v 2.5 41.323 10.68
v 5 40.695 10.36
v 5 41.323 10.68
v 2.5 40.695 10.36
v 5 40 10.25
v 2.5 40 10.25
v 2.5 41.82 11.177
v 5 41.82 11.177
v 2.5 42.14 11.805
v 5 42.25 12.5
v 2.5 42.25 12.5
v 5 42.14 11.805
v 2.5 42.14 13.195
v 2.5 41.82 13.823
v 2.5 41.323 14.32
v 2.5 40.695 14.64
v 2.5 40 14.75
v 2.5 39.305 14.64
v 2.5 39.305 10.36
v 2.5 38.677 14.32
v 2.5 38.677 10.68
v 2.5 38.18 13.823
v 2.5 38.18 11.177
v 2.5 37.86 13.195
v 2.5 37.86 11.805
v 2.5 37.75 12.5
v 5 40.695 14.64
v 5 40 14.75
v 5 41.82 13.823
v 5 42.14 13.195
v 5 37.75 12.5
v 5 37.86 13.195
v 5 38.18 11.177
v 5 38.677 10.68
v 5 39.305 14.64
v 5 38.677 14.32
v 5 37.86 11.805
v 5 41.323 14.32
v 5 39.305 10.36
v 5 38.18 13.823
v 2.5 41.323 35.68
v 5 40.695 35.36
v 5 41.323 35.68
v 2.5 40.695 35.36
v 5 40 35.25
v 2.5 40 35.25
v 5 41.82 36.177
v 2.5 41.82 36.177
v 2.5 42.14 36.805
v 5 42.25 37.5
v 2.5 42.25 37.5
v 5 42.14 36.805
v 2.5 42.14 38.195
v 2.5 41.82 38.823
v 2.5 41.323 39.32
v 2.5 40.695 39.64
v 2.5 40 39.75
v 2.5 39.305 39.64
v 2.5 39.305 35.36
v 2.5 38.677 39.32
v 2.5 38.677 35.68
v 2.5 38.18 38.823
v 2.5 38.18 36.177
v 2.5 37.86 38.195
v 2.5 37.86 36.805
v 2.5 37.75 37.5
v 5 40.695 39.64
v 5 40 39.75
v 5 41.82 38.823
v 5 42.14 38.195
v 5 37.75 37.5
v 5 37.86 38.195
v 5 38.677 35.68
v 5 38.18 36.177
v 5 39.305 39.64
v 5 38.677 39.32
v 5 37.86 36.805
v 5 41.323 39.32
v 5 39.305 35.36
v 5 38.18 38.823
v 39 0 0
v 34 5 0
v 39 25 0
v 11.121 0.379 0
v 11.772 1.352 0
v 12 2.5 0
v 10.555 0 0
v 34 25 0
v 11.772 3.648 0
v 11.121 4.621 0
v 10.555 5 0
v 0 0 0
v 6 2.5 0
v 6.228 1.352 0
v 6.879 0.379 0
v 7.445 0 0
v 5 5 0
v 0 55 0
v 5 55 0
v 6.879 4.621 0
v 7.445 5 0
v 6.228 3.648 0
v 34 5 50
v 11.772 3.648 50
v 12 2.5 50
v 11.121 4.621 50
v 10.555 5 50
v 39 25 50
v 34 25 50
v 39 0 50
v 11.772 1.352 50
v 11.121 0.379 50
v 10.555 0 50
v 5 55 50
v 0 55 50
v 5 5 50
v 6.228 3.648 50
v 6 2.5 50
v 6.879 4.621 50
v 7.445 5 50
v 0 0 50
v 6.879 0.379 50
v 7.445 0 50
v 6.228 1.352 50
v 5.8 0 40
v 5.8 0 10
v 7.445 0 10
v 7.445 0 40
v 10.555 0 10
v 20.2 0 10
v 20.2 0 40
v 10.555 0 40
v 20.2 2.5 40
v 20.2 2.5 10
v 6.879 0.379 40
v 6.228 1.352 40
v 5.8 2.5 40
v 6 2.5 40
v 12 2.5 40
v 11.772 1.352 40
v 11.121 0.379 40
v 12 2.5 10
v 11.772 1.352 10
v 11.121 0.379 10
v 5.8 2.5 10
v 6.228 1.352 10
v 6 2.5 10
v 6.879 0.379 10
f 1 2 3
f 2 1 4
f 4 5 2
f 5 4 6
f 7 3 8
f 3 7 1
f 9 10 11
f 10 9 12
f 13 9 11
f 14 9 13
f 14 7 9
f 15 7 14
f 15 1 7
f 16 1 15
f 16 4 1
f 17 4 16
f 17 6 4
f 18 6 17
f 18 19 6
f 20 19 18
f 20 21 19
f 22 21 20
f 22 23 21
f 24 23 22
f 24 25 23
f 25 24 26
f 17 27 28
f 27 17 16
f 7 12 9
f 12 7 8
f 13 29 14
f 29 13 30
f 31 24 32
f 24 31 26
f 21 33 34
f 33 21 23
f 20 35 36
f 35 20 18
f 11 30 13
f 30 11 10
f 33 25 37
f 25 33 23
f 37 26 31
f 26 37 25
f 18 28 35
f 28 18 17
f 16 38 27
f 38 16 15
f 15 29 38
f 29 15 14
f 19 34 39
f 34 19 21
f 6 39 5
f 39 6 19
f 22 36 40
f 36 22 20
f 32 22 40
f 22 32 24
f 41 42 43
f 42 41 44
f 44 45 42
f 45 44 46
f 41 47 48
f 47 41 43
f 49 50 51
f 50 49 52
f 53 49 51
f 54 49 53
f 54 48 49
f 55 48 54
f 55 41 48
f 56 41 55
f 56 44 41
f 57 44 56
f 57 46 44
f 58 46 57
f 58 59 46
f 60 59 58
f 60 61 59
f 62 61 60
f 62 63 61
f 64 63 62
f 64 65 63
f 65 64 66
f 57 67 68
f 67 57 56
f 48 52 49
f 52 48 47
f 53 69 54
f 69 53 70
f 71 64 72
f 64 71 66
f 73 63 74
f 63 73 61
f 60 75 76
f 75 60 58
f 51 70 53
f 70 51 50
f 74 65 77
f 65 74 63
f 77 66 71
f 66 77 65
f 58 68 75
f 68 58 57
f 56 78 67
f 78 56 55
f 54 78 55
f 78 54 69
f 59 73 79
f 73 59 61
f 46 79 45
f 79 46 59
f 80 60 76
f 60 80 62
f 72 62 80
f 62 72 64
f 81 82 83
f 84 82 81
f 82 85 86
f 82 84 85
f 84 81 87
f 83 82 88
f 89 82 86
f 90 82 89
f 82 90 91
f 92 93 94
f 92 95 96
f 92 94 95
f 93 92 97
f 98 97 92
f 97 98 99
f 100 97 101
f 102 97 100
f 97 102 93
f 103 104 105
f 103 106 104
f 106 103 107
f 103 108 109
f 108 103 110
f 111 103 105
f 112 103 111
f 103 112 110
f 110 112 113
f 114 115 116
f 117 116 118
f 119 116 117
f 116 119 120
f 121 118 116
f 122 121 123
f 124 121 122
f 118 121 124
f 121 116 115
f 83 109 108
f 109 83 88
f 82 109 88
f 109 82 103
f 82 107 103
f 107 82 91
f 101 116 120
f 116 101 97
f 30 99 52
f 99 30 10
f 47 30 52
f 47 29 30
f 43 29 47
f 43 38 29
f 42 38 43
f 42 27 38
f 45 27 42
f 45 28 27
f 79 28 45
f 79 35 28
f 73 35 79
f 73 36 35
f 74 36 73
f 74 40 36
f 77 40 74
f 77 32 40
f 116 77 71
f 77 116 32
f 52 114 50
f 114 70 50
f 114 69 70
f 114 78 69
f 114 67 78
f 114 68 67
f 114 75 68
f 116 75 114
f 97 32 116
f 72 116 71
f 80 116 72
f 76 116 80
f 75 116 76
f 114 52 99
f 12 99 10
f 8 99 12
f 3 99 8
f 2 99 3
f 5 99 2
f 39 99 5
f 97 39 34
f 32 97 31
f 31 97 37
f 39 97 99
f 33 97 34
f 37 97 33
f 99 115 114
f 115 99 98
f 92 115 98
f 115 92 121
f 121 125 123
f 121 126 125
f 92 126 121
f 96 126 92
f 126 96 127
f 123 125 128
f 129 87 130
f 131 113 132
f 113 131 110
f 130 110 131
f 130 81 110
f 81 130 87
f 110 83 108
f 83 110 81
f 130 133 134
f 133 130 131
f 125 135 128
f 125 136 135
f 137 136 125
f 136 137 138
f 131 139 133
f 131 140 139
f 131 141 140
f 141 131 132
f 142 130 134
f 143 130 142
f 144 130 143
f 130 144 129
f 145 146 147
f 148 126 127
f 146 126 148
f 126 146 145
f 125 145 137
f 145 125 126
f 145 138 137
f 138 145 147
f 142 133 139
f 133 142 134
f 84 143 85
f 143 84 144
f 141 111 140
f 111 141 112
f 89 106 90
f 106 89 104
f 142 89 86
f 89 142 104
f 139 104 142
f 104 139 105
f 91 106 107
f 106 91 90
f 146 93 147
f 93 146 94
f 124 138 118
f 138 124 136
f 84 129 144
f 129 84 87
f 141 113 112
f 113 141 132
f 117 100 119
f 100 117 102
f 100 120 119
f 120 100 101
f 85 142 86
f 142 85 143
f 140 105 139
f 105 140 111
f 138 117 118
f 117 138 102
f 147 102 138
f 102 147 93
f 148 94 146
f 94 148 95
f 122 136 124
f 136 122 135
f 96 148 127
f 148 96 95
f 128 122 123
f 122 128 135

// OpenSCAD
// ===================================================================
// UNIVERSAL UNDER-DESK & WALL CLUSTER MOUNT BRACKETS
// Model 3: Space-Saving Modular Brackets (Print 3 pairs)
// Fits all standard 3D printer beds (100 x 60 x 50 mm)
// ===================================================================

laptop_thickness_max = 24.0;  // mm (thickness of laptop when closed)
bracket_depth = 50.0;         // mm
wall_thick = 5.0;             // mm (rigid structural perimeters)
lip_height = 20.0;            // mm retention lip to prevent slipping
screw_hole_dia = 4.5;         // M4 wood screw / drywall anchor
countersink_dia = 9.0;

module screw_hole() {
    cylinder(h = wall_thick + 2, d = screw_hole_dia, $fn = 20);
    translate([0, 0, wall_thick - 2])
        cylinder(h = 2.5, d1 = screw_hole_dia, d2 = countersink_dia, $fn = 20);
}

module laptop_bracket() {
    difference() {
        // Outer L-bracket profile
        linear_extrude(height = bracket_depth) {
            polygon(points = [
                [0, 0],
                [laptop_thickness_max + 2*wall_thick + 5, 0],
                [laptop_thickness_max + 2*wall_thick + 5, wall_thick + lip_height],
                [laptop_thickness_max + wall_thick + 5, wall_thick + lip_height],
                [laptop_thickness_max + wall_thick + 5, wall_thick],
                [wall_thick, wall_thick],
                [wall_thick, 55],
                [0, 55]
            ]);
        }

        // Mounting Screw Holes on top flange
        translate([wall_thick / 2, 40, bracket_depth * 0.25])
            rotate([0, 90, 0]) screw_hole();

        translate([wall_thick / 2, 40, bracket_depth * 0.75])
            rotate([0, 90, 0]) screw_hole();

        // Ventilation Cutouts in bottom ledge
        translate([wall_thick + 8, -1, bracket_depth/2])
            cube([laptop_thickness_max * 0.6, wall_thick + 2, bracket_depth * 0.6], center = true);

        // Cable drop notch
        translate([wall_thick + 4, wall_thick/2, -1])
            cylinder(h = bracket_depth + 2, d = 6, $fn = 16);
    }
}

// Single bracket preview (print 2 per laptop, 6 total for 3 laptops)
laptop_bracket();
